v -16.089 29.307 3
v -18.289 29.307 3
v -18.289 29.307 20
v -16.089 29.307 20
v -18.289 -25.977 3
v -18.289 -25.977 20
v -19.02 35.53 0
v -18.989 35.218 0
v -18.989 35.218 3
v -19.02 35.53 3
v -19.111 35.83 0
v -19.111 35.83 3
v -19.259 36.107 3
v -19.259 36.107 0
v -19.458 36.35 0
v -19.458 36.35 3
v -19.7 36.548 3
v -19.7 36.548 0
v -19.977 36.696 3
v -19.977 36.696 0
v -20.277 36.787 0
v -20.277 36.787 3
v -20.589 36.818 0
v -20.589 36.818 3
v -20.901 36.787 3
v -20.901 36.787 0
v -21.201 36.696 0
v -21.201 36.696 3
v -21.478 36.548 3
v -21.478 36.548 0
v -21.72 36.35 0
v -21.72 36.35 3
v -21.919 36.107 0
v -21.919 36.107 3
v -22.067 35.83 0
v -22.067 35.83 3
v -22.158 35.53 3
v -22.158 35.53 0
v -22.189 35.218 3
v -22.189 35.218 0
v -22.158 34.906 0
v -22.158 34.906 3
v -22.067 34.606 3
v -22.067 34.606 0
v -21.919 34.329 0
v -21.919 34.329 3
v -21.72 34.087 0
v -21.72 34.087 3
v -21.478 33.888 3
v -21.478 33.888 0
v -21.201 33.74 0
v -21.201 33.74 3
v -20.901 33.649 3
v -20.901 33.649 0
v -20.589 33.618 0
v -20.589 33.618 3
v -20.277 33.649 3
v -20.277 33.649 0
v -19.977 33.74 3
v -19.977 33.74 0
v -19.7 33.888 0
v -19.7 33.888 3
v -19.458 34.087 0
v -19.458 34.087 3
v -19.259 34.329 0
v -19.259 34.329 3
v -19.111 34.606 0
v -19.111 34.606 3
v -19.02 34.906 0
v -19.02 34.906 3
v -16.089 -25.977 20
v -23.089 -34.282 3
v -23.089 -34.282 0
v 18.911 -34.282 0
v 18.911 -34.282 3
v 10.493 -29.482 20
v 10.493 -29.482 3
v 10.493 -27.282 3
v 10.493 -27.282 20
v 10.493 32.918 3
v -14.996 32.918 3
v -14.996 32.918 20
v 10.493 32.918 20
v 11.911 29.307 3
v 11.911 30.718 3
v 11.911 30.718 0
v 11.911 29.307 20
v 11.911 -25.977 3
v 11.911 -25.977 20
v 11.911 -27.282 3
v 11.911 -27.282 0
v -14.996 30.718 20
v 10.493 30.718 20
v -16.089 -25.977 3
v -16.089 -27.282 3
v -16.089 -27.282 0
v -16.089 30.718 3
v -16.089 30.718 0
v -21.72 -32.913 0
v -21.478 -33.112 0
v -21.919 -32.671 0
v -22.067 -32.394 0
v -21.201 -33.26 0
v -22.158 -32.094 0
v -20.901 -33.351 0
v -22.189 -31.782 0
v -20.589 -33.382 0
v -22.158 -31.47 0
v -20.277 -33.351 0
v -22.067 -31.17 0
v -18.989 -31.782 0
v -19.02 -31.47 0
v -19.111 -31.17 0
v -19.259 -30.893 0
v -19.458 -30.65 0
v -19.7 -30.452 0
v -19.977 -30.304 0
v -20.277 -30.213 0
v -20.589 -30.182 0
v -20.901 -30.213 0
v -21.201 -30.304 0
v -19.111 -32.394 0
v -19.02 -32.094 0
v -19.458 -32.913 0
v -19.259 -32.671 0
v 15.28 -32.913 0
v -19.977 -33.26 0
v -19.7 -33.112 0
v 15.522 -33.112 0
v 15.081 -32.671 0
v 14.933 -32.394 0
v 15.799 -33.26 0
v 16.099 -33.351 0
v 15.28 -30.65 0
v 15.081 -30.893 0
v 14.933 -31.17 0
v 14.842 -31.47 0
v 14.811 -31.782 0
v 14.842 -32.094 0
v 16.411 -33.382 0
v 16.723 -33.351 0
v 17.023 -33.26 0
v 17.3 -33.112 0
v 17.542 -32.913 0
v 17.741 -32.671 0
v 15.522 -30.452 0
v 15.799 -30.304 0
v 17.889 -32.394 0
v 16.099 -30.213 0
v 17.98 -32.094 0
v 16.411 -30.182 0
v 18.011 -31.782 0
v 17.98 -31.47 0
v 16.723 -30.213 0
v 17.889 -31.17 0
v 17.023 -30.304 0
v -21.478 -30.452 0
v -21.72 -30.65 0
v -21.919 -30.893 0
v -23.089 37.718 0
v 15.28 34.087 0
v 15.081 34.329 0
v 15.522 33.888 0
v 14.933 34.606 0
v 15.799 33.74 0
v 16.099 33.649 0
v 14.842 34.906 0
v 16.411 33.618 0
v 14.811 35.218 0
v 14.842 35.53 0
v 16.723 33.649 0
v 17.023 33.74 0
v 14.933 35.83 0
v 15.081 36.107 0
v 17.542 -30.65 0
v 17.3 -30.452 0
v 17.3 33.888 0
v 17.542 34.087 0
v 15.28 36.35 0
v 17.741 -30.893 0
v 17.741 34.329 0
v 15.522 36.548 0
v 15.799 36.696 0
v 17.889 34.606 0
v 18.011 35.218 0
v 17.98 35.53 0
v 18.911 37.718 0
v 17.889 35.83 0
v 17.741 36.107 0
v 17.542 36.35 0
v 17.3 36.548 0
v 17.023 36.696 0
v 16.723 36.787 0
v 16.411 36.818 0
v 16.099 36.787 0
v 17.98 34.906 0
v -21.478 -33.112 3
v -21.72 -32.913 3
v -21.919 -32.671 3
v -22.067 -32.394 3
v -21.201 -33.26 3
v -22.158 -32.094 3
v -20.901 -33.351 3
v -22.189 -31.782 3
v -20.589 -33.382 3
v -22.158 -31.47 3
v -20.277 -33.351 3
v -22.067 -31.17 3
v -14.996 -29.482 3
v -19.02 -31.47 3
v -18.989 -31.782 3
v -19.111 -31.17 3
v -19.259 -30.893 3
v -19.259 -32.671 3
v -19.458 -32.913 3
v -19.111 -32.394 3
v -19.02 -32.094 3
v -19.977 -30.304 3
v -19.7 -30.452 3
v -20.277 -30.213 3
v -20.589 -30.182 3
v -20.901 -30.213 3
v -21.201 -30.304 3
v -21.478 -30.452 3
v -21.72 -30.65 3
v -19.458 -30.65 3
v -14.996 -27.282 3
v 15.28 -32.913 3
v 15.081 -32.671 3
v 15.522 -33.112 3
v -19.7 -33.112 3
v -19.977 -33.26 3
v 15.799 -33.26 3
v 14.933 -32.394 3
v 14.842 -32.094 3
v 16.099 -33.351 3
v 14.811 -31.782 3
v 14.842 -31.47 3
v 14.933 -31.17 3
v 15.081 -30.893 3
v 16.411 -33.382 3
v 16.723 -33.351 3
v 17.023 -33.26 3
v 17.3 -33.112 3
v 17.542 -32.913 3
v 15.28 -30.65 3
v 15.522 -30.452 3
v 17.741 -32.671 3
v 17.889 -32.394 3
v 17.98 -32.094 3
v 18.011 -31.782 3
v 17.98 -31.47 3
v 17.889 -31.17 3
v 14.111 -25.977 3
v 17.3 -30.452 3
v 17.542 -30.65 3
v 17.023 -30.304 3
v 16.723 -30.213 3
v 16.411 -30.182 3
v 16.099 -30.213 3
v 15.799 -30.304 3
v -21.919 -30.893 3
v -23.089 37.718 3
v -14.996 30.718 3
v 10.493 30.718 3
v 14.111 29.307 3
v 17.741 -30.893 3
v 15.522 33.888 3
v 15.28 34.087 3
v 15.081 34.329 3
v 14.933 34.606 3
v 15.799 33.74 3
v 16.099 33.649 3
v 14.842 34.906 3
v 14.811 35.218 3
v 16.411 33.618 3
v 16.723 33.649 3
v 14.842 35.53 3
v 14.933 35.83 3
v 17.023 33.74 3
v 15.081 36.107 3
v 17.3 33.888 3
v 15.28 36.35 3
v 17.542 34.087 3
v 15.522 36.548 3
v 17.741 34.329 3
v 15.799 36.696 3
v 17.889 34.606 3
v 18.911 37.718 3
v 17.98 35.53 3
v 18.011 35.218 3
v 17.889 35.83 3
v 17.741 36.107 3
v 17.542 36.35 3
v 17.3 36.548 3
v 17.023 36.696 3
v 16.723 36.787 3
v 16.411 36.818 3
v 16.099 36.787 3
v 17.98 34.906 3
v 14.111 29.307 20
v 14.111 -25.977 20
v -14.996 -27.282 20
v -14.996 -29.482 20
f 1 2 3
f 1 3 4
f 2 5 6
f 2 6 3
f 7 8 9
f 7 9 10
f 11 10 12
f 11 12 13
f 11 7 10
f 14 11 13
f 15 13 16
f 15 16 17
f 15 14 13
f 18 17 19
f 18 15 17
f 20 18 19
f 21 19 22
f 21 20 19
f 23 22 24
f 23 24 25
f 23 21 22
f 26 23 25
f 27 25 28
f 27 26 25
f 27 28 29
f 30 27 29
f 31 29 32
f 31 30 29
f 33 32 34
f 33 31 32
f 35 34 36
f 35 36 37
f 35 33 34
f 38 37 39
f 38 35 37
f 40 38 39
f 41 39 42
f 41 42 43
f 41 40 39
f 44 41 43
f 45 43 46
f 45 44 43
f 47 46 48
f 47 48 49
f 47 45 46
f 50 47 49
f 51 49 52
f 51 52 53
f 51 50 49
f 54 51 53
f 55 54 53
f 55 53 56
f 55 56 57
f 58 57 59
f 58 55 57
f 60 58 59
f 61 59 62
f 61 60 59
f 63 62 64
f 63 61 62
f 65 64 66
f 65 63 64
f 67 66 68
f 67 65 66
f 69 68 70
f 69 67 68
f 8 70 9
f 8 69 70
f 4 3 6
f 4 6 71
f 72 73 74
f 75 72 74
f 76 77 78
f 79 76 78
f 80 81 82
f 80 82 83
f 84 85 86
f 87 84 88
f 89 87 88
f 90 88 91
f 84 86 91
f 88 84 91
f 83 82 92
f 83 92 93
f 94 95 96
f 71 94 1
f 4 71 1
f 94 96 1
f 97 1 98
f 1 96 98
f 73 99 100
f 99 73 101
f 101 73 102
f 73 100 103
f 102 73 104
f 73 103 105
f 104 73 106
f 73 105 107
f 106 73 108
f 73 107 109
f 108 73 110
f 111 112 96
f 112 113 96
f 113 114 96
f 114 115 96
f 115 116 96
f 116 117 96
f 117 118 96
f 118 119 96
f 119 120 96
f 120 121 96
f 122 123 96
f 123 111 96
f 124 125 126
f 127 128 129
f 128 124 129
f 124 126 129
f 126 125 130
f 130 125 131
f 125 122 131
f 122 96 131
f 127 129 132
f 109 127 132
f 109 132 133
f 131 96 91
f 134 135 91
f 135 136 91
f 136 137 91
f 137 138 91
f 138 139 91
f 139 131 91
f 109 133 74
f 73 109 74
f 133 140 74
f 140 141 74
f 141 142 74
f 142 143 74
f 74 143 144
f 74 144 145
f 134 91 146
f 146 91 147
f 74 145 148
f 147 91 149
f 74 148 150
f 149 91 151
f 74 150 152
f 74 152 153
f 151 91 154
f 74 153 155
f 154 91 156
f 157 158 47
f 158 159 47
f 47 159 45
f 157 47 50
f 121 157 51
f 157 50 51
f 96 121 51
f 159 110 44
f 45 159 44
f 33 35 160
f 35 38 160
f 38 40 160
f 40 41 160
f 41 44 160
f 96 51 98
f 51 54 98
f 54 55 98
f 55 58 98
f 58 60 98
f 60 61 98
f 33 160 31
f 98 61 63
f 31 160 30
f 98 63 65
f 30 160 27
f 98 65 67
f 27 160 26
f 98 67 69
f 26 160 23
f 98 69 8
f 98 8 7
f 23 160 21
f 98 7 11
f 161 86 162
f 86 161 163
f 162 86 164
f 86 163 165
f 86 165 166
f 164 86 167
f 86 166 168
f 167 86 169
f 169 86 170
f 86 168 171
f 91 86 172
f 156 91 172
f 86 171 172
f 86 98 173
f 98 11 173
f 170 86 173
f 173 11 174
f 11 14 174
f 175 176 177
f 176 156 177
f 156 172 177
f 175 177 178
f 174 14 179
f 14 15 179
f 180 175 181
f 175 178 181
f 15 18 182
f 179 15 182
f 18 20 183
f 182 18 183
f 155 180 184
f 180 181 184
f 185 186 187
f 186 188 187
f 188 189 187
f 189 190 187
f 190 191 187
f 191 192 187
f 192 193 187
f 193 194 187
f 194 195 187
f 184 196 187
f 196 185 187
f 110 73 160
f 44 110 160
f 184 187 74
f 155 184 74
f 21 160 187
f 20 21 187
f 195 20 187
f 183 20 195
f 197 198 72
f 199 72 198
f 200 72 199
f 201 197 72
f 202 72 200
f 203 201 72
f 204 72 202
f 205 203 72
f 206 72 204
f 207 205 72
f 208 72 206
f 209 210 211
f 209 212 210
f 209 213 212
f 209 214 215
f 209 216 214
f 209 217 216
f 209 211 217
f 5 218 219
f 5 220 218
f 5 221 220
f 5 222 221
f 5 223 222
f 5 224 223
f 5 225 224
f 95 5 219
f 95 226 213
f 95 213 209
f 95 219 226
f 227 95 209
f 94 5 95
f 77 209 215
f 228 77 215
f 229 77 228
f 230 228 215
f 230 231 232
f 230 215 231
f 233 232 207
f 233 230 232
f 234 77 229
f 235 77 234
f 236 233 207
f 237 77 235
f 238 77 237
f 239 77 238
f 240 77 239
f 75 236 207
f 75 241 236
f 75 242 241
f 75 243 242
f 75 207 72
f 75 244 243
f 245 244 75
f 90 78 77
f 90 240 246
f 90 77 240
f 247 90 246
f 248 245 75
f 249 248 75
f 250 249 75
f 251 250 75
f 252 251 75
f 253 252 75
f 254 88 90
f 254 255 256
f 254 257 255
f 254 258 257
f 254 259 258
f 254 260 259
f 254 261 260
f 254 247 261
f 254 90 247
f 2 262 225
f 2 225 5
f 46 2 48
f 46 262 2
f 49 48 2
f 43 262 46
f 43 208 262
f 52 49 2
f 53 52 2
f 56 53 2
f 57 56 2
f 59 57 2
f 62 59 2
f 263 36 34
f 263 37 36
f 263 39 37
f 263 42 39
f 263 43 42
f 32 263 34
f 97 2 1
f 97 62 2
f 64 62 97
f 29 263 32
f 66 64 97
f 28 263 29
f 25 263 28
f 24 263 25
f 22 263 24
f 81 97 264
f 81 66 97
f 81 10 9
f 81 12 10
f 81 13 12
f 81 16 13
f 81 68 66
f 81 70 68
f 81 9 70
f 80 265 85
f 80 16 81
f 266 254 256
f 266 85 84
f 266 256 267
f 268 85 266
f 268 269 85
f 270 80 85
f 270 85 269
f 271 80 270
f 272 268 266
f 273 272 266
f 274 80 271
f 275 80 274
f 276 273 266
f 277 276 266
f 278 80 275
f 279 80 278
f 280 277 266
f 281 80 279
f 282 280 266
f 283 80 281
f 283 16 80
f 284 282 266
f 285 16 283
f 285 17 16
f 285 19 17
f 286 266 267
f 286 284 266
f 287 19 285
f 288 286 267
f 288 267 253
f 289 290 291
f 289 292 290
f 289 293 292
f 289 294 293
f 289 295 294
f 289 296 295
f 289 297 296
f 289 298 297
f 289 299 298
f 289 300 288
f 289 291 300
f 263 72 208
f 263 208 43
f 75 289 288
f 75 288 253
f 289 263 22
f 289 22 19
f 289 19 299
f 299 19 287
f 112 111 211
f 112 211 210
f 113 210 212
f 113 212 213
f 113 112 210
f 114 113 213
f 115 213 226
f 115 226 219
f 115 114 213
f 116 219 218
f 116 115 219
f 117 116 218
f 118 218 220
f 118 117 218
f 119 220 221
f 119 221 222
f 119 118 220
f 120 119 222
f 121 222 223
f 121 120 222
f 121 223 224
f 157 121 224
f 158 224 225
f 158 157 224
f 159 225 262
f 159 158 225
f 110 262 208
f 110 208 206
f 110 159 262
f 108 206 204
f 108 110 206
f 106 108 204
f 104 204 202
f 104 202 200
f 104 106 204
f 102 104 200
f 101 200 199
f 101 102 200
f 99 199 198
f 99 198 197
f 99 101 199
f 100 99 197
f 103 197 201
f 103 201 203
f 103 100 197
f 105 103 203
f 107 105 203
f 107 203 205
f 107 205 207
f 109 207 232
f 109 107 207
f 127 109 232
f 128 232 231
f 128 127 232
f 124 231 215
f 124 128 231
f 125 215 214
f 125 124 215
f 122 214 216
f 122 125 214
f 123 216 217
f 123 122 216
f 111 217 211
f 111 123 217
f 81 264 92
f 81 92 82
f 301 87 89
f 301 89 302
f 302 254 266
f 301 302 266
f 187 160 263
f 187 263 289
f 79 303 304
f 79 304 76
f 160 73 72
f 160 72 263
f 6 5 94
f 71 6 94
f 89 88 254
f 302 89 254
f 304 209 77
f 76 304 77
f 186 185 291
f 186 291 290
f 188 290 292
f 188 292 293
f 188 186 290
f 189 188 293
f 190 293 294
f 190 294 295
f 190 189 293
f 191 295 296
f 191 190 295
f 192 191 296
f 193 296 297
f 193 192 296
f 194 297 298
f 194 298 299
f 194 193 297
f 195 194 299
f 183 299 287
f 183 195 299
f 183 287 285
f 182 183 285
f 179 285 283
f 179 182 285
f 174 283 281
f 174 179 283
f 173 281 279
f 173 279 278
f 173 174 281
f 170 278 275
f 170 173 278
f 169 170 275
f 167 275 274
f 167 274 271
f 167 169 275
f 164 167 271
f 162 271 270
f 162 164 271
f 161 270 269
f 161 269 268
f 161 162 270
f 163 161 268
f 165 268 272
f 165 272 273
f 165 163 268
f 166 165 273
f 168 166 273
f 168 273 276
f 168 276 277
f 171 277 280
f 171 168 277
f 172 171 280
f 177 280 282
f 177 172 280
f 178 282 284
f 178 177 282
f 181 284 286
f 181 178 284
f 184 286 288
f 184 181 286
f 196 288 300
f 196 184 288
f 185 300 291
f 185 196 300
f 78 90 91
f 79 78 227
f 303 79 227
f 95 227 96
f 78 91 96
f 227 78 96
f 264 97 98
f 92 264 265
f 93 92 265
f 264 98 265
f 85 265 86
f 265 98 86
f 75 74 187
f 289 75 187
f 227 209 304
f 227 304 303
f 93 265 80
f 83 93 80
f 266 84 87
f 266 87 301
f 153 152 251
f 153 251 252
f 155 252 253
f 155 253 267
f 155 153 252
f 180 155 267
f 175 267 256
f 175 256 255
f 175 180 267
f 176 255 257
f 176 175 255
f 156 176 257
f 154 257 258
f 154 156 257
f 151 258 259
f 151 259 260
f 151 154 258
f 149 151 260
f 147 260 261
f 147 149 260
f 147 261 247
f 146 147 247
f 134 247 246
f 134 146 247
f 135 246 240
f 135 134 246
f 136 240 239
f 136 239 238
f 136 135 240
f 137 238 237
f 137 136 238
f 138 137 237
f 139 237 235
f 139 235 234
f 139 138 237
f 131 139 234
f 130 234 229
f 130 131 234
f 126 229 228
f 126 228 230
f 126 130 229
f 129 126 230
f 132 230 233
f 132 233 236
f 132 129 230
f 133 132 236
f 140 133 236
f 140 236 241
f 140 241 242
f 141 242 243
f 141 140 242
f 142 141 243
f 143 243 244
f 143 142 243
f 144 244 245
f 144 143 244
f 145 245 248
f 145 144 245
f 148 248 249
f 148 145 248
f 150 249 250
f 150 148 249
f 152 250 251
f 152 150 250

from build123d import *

# Parameters (mm, degrees)
F0_W     = 42
F0_H     = 72
F0_R     = 1.6
F1_DEPTH = 3
F0_W_2   = 25.488504
F0_H_2   = 2.2
F0_W_3   = 2.2
F0_H_3   = 55.283766
F2_DEPTH = 20


with BuildPart() as f1:
    # F0 (on Top) → F1 (new body)
    with BuildSketch(Plane.XY):
        with Locations((-2.088945, 1.718141)):
            Rectangle(F0_W, F0_H)
        with Locations((-20.588945, -31.781859)):
            Circle(F0_R, mode=Mode.SUBTRACT)
        with Locations((16.411055, -31.781859)):
            Circle(F0_R, mode=Mode.SUBTRACT)
        with Locations((-20.588945, 35.218141)):
            Circle(F0_R, mode=Mode.SUBTRACT)
        Polygon((-18.288945, 32.918141), (-14.99591, 32.918141), (10.492594, 32.918141), (14.111055, 32.918141), (14.111055, 29.307075), (14.111055, -25.976691), (14.111055, -27.281859), (14.111055, -29.481859), (10.492594, -29.481859), (-14.99591, -29.481859), (-18.288945, -29.481859), (-18.288945, -25.976691), (-18.288945, 29.307075), align=None, mode=Mode.SUBTRACT)
        with Locations((16.411055, 35.218141)):
            Circle(F0_R, mode=Mode.SUBTRACT)
        Polygon((-16.088945, -27.281859), (-16.088945, -25.976691), (-18.288945, -25.976691), (-18.288945, -29.481859), (-14.99591, -29.481859), (-14.99591, -27.281859), align=None)
        Polygon((-16.088945, 29.307075), (-16.088945, 30.718141), (-14.99591, 30.718141), (-14.99591, 32.918141), (-18.288945, 32.918141), (-18.288945, 29.307075), align=None)
        Polygon((10.492594, 32.918141), (10.492594, 30.718141), (11.911055, 30.718141), (11.911055, 29.307075), (14.111055, 29.307075), (14.111055, 32.918141), align=None)
        Polygon((14.111055, -25.976691), (11.911055, -25.976691), (11.911055, -27.281859), (10.492594, -27.281859), (10.492594, -29.481859), (14.111055, -29.481859), (14.111055, -27.281859), align=None)
    extrude(amount=F1_DEPTH)

    # F0 (on Top) → F2 (join)
    with BuildSketch(Plane.XY):
        with Locations((-2.251658, 31.818141)):
            Rectangle(F0_W_2, F0_H_2)
        with Locations((-17.188945, 1.665192)):
            Rectangle(F0_W_3, F0_H_3)
        with Locations((13.011055, 1.665192)):
            Rectangle(F0_W_3, F0_H_3)
        with Locations((-2.251658, -28.381859)):
            Rectangle(F0_W_2, F0_H_2)
    extrude(amount=F2_DEPTH)


solid = f1.part
